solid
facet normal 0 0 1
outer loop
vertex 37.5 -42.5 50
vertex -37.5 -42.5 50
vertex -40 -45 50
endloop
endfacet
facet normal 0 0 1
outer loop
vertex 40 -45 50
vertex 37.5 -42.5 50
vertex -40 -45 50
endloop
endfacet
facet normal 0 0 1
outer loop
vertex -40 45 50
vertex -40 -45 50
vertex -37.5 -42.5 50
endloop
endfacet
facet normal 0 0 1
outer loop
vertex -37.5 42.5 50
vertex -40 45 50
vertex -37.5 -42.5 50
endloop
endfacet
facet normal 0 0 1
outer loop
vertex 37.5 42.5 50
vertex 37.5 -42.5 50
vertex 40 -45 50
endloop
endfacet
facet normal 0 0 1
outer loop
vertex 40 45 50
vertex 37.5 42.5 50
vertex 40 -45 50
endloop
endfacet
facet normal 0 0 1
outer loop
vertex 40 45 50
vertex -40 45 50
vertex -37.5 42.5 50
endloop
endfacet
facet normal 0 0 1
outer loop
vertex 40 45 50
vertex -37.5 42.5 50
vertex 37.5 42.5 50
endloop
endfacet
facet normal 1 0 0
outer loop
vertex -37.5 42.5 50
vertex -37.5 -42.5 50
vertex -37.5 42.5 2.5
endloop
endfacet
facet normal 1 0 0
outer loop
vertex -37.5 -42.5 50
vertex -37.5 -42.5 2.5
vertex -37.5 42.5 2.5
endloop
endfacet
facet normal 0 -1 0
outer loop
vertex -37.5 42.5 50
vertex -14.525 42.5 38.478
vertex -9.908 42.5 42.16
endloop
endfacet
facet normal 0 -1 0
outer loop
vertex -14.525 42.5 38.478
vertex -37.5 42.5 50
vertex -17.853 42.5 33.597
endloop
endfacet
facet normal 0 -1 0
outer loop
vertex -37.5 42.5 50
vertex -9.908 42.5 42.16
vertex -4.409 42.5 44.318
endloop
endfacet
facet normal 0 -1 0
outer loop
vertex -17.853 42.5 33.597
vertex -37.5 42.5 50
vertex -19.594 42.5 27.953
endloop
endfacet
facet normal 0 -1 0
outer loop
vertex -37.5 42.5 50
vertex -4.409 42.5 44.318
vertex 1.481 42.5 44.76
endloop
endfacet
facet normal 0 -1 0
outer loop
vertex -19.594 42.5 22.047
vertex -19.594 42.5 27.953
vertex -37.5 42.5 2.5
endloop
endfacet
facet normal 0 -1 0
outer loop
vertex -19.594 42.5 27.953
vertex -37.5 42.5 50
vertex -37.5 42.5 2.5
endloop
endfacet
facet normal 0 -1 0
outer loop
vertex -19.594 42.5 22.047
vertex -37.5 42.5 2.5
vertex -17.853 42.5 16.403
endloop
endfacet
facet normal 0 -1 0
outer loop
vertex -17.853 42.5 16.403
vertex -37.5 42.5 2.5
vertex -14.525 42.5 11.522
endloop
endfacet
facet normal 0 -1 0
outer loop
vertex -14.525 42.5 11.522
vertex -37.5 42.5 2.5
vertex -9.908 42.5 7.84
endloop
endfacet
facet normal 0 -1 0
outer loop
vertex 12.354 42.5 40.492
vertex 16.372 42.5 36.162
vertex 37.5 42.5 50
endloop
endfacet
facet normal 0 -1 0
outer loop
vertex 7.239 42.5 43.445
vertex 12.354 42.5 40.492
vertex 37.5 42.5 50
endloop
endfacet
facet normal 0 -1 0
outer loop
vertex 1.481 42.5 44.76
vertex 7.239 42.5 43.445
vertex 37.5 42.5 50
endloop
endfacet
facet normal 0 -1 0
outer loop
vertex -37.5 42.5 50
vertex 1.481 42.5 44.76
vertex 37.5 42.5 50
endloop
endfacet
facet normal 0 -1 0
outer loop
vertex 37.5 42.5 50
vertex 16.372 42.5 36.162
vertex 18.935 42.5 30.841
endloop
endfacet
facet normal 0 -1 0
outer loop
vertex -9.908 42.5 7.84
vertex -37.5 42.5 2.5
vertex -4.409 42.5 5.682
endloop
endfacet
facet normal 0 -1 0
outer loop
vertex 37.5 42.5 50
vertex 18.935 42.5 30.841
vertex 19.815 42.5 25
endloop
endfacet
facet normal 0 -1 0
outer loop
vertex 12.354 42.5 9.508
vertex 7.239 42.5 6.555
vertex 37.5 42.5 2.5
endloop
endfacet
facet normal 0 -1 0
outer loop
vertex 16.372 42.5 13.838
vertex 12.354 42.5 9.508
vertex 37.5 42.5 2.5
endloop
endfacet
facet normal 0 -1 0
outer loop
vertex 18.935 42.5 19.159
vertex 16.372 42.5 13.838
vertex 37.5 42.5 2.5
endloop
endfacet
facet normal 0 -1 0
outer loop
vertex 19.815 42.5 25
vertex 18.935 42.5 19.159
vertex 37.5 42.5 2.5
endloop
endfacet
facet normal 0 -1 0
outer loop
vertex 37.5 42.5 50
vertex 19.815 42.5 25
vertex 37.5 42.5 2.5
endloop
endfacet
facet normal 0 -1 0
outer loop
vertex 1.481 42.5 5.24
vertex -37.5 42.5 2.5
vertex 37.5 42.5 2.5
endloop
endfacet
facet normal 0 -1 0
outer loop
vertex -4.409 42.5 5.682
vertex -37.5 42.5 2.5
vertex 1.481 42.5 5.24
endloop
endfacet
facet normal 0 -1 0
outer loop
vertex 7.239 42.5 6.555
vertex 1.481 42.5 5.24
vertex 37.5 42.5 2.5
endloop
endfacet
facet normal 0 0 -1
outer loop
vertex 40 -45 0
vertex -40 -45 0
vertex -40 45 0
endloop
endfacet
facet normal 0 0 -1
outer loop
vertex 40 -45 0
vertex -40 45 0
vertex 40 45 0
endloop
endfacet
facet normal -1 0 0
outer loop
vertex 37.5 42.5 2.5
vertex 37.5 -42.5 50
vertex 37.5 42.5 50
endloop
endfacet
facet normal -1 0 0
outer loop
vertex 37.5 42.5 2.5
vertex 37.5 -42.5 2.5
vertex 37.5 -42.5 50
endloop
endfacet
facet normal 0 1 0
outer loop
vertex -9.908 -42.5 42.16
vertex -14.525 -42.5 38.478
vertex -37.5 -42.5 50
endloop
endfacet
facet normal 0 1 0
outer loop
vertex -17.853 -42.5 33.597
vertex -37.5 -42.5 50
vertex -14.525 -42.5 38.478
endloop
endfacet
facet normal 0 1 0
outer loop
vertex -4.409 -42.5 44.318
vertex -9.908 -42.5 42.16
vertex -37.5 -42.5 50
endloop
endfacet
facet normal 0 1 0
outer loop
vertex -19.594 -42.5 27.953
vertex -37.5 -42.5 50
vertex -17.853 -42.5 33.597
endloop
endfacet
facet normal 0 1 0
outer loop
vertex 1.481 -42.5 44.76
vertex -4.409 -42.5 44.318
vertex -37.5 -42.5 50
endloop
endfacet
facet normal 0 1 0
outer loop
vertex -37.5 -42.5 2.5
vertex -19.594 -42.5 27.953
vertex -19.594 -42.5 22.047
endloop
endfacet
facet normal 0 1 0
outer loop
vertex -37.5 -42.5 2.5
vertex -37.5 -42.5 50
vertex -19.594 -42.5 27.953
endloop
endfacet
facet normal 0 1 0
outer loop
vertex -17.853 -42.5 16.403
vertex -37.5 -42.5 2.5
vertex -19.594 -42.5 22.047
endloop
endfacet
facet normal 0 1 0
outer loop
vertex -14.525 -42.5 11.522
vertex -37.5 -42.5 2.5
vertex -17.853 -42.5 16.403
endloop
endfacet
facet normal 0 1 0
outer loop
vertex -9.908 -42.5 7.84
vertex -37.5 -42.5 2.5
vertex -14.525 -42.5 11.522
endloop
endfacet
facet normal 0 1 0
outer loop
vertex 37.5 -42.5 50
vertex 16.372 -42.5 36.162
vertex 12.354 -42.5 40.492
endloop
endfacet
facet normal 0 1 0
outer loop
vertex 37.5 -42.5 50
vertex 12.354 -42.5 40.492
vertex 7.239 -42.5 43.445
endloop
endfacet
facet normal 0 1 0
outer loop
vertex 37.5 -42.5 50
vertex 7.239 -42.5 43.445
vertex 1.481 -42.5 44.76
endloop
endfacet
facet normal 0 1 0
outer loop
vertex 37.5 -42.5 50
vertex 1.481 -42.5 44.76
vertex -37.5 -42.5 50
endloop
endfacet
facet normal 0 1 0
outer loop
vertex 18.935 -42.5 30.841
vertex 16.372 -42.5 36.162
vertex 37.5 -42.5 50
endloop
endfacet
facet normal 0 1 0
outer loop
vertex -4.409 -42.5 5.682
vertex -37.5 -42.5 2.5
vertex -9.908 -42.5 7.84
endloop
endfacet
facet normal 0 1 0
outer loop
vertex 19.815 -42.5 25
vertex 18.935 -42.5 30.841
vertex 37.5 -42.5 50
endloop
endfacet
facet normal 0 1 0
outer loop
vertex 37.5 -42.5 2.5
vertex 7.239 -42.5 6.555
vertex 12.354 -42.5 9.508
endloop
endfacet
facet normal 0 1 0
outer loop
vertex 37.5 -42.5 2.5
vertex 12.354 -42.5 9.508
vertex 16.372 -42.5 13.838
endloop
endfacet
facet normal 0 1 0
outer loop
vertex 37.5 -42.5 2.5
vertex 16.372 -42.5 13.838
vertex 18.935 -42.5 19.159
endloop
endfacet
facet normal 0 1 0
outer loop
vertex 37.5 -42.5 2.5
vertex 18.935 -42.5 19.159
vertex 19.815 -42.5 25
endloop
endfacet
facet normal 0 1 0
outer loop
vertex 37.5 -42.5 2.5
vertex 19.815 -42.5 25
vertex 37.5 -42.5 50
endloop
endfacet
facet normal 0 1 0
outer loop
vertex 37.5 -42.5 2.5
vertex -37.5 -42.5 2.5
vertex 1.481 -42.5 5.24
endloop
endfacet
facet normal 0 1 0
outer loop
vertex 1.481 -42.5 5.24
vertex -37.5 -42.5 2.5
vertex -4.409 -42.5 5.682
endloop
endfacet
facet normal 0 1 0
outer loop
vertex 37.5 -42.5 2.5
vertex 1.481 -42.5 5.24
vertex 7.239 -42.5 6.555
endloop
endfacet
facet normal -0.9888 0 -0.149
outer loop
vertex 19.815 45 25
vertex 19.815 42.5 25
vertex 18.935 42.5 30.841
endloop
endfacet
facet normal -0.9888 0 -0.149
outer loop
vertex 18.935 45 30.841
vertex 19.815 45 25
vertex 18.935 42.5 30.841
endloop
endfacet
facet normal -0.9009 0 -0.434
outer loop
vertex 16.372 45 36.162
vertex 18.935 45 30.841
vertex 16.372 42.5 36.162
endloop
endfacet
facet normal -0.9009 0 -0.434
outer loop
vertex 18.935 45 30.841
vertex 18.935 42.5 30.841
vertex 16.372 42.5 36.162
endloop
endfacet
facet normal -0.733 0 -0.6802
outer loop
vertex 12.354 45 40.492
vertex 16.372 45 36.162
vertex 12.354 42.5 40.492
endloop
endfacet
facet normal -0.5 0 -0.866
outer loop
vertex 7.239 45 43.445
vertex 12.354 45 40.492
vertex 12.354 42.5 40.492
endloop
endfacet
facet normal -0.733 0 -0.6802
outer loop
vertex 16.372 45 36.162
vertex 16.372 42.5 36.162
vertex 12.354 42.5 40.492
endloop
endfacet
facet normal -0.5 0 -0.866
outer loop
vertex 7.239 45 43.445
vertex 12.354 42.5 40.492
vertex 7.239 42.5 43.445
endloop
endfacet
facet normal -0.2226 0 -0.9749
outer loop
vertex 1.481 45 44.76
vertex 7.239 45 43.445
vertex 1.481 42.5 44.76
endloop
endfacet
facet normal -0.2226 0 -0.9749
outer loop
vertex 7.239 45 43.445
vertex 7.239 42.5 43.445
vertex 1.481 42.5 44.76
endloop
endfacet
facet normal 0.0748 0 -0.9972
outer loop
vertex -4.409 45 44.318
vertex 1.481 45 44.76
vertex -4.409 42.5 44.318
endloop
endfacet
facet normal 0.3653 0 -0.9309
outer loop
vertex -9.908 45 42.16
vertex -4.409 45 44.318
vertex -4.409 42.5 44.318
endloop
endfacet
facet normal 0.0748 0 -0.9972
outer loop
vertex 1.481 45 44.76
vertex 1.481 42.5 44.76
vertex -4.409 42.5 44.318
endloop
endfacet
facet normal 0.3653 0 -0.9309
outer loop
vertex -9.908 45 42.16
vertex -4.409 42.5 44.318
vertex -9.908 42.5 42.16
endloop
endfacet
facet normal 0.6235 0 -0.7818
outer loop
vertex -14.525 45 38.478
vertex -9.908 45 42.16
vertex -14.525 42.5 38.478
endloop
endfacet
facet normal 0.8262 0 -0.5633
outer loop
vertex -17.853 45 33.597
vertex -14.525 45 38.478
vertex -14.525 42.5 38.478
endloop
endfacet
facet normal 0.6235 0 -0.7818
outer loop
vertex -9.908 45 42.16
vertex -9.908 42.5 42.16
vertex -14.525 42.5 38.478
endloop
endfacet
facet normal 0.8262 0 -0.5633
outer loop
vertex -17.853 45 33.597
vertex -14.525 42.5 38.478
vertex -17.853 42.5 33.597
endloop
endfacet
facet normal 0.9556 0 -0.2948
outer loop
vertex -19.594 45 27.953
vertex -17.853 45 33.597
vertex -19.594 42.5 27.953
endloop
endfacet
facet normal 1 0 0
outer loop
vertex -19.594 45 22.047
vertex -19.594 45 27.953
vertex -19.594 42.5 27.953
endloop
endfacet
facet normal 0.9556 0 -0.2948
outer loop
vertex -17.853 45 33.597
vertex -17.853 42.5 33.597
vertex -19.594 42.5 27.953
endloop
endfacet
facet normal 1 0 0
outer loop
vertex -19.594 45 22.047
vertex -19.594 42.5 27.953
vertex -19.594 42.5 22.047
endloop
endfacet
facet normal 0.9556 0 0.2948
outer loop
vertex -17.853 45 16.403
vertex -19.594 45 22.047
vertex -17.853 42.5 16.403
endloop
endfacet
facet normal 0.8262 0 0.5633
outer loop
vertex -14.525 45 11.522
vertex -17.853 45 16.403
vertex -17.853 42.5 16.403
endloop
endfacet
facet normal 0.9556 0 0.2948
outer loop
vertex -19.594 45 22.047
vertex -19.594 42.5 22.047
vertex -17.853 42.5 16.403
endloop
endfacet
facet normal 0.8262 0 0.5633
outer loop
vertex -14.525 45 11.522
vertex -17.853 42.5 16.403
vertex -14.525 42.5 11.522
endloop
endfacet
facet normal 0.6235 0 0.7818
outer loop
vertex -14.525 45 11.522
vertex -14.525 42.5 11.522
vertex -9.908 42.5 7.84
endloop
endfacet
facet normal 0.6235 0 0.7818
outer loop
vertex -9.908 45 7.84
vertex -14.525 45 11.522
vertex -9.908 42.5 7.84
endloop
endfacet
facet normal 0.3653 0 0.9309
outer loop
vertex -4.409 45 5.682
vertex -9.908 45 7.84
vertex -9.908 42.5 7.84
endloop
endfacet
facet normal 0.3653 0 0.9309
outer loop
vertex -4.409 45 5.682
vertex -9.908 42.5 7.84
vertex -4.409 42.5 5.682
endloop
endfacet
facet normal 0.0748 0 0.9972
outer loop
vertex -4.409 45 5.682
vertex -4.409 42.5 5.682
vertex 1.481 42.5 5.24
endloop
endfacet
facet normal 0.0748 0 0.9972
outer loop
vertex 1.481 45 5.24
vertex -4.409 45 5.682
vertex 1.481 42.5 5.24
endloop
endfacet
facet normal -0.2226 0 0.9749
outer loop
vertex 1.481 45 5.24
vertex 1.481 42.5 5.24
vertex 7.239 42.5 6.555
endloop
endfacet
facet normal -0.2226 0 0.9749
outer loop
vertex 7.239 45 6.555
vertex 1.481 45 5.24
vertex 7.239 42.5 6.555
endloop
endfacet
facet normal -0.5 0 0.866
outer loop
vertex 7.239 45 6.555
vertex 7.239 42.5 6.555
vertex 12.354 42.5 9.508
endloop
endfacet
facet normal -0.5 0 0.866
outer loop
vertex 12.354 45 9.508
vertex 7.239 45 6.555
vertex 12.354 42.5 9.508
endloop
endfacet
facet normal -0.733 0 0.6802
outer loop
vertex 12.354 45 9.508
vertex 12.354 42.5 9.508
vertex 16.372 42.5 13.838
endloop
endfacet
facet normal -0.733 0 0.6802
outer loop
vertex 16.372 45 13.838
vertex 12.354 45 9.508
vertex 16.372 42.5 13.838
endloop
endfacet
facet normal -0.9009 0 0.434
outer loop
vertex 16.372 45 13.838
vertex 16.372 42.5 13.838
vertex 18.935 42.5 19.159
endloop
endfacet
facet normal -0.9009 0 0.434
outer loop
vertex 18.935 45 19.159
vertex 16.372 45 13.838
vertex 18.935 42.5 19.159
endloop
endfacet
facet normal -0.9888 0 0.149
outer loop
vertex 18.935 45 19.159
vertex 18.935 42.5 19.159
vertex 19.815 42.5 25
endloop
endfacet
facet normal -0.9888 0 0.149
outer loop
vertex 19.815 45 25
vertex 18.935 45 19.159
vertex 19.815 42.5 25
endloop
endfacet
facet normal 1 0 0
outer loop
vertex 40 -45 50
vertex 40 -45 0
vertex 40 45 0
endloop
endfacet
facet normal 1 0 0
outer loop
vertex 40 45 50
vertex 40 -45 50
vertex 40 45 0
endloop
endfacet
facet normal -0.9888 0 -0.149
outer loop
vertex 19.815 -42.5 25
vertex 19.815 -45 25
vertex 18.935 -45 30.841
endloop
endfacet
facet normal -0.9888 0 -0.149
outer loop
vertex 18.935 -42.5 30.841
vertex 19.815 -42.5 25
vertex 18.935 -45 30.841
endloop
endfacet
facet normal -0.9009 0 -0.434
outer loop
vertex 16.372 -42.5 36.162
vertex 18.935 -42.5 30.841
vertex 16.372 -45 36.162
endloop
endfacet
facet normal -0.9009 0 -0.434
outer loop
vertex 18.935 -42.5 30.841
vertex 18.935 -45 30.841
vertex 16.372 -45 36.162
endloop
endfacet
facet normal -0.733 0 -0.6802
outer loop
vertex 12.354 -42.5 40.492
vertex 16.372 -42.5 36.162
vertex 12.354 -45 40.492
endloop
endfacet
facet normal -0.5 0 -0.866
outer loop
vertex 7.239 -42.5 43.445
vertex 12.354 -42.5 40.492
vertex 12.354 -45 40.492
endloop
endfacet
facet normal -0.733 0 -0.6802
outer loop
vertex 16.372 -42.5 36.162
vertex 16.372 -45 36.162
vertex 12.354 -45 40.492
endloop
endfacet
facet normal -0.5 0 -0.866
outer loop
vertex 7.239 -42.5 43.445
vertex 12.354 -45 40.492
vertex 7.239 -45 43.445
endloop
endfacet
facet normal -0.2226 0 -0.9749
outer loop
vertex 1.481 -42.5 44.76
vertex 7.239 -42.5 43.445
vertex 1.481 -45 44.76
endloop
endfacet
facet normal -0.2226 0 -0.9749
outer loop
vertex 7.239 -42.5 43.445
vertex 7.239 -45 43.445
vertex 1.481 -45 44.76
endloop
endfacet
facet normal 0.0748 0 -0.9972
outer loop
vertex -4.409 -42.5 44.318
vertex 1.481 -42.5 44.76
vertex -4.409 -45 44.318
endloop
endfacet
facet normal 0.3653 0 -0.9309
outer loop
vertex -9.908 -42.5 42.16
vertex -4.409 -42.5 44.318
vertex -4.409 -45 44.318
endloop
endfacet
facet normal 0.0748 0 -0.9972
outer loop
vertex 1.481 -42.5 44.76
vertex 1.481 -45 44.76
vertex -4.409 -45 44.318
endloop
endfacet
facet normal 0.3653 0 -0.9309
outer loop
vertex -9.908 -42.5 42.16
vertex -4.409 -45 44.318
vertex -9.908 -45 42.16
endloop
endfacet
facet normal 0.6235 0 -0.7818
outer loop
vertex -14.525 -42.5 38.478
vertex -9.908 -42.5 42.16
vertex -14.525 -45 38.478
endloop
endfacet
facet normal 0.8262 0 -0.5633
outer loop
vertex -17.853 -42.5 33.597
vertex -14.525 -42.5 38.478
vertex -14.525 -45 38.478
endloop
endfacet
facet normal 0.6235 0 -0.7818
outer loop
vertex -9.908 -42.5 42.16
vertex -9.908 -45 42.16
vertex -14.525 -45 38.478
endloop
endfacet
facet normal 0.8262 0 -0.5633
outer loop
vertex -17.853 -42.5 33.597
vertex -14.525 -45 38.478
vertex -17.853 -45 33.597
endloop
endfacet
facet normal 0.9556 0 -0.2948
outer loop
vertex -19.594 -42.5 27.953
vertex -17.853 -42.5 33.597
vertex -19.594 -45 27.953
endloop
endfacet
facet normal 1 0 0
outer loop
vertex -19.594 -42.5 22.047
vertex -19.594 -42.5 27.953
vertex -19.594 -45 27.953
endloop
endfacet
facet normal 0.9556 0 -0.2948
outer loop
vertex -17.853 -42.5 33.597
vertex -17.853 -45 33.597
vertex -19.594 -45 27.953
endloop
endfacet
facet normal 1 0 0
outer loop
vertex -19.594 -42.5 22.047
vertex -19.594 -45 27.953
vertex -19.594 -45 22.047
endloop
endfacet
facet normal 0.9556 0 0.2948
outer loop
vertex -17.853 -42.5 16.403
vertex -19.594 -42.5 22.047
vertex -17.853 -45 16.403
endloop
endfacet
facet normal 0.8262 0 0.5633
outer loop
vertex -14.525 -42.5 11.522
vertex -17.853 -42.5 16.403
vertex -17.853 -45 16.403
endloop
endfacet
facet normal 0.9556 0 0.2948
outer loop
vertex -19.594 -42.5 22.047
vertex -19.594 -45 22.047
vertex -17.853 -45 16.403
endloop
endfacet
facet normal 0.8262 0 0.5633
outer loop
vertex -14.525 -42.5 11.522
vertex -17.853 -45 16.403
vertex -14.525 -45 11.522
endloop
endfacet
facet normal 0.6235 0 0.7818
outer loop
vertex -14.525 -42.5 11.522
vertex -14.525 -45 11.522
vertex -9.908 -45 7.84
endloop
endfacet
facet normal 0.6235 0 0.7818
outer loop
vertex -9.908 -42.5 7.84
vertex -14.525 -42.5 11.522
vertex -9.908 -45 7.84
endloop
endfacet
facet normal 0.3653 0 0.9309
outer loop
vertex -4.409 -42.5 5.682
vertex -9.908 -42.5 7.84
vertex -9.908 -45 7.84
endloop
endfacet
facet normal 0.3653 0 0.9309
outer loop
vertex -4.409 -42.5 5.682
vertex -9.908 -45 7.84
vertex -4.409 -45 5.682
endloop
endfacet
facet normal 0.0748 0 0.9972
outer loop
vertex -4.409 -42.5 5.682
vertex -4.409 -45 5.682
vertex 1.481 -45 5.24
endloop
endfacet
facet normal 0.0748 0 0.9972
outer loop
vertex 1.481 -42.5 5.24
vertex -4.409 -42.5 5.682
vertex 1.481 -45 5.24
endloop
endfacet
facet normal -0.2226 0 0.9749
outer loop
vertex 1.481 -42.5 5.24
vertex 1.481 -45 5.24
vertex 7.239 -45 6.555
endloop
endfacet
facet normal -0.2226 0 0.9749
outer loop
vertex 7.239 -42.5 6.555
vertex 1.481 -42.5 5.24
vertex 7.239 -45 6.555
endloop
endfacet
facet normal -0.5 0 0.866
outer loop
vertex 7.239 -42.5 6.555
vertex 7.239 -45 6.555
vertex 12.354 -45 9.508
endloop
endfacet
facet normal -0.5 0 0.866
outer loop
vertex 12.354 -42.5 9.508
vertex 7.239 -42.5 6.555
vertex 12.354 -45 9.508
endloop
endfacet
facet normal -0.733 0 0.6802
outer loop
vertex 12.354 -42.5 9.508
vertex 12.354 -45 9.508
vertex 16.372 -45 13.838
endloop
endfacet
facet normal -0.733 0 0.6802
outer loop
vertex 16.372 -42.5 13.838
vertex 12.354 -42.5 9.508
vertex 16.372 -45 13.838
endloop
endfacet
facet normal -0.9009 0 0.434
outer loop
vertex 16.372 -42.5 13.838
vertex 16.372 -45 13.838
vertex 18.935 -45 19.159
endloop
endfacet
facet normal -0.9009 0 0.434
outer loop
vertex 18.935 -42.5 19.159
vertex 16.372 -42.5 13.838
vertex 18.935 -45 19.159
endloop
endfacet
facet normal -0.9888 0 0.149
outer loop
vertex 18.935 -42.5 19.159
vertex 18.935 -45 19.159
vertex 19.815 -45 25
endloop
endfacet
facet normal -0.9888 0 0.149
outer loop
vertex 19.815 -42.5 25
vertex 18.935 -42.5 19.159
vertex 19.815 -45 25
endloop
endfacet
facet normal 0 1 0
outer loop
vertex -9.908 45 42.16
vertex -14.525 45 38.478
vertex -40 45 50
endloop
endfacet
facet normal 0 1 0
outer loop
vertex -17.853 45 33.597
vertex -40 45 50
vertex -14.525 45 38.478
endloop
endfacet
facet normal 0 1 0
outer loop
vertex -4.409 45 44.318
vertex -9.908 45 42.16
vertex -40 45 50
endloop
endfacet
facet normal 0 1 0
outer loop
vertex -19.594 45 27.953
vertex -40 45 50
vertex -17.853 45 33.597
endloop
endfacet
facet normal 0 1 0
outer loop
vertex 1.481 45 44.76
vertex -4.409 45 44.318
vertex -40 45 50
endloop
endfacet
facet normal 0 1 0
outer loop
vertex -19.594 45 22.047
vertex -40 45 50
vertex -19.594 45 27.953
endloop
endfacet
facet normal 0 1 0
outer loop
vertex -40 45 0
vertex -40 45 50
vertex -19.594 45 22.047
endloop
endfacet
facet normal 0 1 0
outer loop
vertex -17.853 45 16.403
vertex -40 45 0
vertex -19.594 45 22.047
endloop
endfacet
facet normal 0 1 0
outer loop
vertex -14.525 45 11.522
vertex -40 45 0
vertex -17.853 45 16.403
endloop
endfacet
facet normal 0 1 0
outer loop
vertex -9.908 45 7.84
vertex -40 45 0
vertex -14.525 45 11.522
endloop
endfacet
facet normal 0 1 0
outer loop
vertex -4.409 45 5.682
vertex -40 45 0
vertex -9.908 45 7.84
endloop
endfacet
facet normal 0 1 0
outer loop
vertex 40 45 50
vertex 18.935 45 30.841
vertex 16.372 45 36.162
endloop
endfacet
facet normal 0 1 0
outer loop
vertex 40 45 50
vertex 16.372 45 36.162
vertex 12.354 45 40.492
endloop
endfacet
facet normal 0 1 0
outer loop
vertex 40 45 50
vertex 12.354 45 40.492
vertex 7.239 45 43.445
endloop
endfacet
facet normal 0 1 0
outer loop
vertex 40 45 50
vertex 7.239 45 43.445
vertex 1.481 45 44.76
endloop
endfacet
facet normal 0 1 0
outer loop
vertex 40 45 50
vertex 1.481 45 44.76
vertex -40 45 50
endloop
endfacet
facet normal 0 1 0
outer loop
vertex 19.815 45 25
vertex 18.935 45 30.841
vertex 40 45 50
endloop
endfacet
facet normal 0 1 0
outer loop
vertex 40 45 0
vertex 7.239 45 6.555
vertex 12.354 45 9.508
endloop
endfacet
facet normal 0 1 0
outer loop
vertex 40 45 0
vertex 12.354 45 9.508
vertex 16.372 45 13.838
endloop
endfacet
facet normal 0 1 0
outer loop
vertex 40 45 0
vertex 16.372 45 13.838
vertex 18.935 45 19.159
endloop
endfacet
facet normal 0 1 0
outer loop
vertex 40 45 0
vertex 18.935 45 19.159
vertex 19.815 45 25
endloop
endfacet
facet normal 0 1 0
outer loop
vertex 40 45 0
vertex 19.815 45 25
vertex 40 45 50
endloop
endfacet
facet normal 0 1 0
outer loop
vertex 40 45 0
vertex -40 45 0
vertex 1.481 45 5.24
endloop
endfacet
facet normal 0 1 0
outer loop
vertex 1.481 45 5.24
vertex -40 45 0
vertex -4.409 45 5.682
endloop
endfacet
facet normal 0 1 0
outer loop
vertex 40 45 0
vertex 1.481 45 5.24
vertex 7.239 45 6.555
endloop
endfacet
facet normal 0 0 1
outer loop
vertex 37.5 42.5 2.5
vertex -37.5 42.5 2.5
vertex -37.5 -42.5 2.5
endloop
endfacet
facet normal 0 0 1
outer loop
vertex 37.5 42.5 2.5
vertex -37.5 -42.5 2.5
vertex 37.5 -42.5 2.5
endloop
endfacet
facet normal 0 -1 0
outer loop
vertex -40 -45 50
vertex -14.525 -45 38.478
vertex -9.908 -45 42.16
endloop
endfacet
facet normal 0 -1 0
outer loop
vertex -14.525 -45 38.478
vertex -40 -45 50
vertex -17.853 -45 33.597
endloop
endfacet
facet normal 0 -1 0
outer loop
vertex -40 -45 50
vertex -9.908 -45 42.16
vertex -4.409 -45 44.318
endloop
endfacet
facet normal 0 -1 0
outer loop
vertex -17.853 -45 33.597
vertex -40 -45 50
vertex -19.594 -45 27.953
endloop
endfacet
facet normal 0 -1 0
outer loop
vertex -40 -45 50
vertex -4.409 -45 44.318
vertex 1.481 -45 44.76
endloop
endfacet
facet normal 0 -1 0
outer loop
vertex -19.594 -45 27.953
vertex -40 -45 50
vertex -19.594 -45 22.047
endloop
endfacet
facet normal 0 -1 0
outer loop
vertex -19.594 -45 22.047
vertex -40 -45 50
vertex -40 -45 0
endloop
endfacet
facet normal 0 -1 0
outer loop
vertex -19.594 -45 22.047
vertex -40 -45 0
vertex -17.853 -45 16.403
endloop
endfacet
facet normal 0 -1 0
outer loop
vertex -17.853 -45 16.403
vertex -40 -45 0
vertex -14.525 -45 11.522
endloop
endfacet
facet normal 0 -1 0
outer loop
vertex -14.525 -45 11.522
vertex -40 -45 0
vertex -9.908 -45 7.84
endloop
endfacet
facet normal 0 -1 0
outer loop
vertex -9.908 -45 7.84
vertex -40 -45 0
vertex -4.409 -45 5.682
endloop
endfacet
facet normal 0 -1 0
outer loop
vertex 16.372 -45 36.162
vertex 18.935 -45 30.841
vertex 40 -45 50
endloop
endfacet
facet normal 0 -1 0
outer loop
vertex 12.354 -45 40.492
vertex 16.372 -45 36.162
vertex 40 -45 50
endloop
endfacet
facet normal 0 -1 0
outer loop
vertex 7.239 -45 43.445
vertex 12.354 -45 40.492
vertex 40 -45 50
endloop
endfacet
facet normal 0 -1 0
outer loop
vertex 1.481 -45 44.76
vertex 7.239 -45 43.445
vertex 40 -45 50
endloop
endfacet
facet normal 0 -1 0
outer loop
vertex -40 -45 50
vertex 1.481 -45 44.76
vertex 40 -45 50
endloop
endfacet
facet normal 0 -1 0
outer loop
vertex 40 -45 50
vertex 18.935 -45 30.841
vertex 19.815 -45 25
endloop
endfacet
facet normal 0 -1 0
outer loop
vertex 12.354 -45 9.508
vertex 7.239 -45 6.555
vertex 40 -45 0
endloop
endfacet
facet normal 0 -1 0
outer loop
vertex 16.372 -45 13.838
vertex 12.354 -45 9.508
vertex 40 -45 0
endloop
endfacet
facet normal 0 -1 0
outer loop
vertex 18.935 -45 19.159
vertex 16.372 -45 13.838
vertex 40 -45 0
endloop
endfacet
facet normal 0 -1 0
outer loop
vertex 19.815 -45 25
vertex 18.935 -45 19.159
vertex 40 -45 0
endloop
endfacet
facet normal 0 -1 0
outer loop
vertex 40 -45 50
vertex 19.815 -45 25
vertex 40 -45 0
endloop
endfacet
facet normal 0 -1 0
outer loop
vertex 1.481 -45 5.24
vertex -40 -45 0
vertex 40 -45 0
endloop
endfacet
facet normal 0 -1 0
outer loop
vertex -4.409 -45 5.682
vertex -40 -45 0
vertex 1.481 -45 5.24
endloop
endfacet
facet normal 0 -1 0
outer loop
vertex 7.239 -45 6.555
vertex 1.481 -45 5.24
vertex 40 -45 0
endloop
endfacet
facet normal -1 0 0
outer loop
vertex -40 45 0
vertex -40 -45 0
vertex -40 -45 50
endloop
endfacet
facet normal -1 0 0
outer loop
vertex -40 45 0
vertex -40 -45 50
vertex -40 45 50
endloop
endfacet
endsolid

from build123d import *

# Parameters (mm, degrees)
F0_W     = 80
F0_H     = 90
F1_DEPTH = 50
F2_T     = -2.5
F3_R     = 19.815
F4_DEPTH = 90.001


with BuildPart() as f1:
    # F0 (on Top) → F1 (new body)
    with BuildSketch(Plane.XY):
        Rectangle(F0_W, F0_H)
    extrude(amount=F1_DEPTH)

    # F2
    f2_openings = [f1.faces().sort_by_distance(p)[0] for p in [
        (0, 0, 50),
    ]]
    offset(amount=F2_T, openings=f2_openings)

    # F3 (on face) → F4 (cut, through all)
    with BuildSketch(Plane.XZ.offset(45)):
        with Locations((0, 25)):
            Circle(F3_R)
    extrude(amount=-F4_DEPTH, mode=Mode.SUBTRACT)


solid = f1.part
